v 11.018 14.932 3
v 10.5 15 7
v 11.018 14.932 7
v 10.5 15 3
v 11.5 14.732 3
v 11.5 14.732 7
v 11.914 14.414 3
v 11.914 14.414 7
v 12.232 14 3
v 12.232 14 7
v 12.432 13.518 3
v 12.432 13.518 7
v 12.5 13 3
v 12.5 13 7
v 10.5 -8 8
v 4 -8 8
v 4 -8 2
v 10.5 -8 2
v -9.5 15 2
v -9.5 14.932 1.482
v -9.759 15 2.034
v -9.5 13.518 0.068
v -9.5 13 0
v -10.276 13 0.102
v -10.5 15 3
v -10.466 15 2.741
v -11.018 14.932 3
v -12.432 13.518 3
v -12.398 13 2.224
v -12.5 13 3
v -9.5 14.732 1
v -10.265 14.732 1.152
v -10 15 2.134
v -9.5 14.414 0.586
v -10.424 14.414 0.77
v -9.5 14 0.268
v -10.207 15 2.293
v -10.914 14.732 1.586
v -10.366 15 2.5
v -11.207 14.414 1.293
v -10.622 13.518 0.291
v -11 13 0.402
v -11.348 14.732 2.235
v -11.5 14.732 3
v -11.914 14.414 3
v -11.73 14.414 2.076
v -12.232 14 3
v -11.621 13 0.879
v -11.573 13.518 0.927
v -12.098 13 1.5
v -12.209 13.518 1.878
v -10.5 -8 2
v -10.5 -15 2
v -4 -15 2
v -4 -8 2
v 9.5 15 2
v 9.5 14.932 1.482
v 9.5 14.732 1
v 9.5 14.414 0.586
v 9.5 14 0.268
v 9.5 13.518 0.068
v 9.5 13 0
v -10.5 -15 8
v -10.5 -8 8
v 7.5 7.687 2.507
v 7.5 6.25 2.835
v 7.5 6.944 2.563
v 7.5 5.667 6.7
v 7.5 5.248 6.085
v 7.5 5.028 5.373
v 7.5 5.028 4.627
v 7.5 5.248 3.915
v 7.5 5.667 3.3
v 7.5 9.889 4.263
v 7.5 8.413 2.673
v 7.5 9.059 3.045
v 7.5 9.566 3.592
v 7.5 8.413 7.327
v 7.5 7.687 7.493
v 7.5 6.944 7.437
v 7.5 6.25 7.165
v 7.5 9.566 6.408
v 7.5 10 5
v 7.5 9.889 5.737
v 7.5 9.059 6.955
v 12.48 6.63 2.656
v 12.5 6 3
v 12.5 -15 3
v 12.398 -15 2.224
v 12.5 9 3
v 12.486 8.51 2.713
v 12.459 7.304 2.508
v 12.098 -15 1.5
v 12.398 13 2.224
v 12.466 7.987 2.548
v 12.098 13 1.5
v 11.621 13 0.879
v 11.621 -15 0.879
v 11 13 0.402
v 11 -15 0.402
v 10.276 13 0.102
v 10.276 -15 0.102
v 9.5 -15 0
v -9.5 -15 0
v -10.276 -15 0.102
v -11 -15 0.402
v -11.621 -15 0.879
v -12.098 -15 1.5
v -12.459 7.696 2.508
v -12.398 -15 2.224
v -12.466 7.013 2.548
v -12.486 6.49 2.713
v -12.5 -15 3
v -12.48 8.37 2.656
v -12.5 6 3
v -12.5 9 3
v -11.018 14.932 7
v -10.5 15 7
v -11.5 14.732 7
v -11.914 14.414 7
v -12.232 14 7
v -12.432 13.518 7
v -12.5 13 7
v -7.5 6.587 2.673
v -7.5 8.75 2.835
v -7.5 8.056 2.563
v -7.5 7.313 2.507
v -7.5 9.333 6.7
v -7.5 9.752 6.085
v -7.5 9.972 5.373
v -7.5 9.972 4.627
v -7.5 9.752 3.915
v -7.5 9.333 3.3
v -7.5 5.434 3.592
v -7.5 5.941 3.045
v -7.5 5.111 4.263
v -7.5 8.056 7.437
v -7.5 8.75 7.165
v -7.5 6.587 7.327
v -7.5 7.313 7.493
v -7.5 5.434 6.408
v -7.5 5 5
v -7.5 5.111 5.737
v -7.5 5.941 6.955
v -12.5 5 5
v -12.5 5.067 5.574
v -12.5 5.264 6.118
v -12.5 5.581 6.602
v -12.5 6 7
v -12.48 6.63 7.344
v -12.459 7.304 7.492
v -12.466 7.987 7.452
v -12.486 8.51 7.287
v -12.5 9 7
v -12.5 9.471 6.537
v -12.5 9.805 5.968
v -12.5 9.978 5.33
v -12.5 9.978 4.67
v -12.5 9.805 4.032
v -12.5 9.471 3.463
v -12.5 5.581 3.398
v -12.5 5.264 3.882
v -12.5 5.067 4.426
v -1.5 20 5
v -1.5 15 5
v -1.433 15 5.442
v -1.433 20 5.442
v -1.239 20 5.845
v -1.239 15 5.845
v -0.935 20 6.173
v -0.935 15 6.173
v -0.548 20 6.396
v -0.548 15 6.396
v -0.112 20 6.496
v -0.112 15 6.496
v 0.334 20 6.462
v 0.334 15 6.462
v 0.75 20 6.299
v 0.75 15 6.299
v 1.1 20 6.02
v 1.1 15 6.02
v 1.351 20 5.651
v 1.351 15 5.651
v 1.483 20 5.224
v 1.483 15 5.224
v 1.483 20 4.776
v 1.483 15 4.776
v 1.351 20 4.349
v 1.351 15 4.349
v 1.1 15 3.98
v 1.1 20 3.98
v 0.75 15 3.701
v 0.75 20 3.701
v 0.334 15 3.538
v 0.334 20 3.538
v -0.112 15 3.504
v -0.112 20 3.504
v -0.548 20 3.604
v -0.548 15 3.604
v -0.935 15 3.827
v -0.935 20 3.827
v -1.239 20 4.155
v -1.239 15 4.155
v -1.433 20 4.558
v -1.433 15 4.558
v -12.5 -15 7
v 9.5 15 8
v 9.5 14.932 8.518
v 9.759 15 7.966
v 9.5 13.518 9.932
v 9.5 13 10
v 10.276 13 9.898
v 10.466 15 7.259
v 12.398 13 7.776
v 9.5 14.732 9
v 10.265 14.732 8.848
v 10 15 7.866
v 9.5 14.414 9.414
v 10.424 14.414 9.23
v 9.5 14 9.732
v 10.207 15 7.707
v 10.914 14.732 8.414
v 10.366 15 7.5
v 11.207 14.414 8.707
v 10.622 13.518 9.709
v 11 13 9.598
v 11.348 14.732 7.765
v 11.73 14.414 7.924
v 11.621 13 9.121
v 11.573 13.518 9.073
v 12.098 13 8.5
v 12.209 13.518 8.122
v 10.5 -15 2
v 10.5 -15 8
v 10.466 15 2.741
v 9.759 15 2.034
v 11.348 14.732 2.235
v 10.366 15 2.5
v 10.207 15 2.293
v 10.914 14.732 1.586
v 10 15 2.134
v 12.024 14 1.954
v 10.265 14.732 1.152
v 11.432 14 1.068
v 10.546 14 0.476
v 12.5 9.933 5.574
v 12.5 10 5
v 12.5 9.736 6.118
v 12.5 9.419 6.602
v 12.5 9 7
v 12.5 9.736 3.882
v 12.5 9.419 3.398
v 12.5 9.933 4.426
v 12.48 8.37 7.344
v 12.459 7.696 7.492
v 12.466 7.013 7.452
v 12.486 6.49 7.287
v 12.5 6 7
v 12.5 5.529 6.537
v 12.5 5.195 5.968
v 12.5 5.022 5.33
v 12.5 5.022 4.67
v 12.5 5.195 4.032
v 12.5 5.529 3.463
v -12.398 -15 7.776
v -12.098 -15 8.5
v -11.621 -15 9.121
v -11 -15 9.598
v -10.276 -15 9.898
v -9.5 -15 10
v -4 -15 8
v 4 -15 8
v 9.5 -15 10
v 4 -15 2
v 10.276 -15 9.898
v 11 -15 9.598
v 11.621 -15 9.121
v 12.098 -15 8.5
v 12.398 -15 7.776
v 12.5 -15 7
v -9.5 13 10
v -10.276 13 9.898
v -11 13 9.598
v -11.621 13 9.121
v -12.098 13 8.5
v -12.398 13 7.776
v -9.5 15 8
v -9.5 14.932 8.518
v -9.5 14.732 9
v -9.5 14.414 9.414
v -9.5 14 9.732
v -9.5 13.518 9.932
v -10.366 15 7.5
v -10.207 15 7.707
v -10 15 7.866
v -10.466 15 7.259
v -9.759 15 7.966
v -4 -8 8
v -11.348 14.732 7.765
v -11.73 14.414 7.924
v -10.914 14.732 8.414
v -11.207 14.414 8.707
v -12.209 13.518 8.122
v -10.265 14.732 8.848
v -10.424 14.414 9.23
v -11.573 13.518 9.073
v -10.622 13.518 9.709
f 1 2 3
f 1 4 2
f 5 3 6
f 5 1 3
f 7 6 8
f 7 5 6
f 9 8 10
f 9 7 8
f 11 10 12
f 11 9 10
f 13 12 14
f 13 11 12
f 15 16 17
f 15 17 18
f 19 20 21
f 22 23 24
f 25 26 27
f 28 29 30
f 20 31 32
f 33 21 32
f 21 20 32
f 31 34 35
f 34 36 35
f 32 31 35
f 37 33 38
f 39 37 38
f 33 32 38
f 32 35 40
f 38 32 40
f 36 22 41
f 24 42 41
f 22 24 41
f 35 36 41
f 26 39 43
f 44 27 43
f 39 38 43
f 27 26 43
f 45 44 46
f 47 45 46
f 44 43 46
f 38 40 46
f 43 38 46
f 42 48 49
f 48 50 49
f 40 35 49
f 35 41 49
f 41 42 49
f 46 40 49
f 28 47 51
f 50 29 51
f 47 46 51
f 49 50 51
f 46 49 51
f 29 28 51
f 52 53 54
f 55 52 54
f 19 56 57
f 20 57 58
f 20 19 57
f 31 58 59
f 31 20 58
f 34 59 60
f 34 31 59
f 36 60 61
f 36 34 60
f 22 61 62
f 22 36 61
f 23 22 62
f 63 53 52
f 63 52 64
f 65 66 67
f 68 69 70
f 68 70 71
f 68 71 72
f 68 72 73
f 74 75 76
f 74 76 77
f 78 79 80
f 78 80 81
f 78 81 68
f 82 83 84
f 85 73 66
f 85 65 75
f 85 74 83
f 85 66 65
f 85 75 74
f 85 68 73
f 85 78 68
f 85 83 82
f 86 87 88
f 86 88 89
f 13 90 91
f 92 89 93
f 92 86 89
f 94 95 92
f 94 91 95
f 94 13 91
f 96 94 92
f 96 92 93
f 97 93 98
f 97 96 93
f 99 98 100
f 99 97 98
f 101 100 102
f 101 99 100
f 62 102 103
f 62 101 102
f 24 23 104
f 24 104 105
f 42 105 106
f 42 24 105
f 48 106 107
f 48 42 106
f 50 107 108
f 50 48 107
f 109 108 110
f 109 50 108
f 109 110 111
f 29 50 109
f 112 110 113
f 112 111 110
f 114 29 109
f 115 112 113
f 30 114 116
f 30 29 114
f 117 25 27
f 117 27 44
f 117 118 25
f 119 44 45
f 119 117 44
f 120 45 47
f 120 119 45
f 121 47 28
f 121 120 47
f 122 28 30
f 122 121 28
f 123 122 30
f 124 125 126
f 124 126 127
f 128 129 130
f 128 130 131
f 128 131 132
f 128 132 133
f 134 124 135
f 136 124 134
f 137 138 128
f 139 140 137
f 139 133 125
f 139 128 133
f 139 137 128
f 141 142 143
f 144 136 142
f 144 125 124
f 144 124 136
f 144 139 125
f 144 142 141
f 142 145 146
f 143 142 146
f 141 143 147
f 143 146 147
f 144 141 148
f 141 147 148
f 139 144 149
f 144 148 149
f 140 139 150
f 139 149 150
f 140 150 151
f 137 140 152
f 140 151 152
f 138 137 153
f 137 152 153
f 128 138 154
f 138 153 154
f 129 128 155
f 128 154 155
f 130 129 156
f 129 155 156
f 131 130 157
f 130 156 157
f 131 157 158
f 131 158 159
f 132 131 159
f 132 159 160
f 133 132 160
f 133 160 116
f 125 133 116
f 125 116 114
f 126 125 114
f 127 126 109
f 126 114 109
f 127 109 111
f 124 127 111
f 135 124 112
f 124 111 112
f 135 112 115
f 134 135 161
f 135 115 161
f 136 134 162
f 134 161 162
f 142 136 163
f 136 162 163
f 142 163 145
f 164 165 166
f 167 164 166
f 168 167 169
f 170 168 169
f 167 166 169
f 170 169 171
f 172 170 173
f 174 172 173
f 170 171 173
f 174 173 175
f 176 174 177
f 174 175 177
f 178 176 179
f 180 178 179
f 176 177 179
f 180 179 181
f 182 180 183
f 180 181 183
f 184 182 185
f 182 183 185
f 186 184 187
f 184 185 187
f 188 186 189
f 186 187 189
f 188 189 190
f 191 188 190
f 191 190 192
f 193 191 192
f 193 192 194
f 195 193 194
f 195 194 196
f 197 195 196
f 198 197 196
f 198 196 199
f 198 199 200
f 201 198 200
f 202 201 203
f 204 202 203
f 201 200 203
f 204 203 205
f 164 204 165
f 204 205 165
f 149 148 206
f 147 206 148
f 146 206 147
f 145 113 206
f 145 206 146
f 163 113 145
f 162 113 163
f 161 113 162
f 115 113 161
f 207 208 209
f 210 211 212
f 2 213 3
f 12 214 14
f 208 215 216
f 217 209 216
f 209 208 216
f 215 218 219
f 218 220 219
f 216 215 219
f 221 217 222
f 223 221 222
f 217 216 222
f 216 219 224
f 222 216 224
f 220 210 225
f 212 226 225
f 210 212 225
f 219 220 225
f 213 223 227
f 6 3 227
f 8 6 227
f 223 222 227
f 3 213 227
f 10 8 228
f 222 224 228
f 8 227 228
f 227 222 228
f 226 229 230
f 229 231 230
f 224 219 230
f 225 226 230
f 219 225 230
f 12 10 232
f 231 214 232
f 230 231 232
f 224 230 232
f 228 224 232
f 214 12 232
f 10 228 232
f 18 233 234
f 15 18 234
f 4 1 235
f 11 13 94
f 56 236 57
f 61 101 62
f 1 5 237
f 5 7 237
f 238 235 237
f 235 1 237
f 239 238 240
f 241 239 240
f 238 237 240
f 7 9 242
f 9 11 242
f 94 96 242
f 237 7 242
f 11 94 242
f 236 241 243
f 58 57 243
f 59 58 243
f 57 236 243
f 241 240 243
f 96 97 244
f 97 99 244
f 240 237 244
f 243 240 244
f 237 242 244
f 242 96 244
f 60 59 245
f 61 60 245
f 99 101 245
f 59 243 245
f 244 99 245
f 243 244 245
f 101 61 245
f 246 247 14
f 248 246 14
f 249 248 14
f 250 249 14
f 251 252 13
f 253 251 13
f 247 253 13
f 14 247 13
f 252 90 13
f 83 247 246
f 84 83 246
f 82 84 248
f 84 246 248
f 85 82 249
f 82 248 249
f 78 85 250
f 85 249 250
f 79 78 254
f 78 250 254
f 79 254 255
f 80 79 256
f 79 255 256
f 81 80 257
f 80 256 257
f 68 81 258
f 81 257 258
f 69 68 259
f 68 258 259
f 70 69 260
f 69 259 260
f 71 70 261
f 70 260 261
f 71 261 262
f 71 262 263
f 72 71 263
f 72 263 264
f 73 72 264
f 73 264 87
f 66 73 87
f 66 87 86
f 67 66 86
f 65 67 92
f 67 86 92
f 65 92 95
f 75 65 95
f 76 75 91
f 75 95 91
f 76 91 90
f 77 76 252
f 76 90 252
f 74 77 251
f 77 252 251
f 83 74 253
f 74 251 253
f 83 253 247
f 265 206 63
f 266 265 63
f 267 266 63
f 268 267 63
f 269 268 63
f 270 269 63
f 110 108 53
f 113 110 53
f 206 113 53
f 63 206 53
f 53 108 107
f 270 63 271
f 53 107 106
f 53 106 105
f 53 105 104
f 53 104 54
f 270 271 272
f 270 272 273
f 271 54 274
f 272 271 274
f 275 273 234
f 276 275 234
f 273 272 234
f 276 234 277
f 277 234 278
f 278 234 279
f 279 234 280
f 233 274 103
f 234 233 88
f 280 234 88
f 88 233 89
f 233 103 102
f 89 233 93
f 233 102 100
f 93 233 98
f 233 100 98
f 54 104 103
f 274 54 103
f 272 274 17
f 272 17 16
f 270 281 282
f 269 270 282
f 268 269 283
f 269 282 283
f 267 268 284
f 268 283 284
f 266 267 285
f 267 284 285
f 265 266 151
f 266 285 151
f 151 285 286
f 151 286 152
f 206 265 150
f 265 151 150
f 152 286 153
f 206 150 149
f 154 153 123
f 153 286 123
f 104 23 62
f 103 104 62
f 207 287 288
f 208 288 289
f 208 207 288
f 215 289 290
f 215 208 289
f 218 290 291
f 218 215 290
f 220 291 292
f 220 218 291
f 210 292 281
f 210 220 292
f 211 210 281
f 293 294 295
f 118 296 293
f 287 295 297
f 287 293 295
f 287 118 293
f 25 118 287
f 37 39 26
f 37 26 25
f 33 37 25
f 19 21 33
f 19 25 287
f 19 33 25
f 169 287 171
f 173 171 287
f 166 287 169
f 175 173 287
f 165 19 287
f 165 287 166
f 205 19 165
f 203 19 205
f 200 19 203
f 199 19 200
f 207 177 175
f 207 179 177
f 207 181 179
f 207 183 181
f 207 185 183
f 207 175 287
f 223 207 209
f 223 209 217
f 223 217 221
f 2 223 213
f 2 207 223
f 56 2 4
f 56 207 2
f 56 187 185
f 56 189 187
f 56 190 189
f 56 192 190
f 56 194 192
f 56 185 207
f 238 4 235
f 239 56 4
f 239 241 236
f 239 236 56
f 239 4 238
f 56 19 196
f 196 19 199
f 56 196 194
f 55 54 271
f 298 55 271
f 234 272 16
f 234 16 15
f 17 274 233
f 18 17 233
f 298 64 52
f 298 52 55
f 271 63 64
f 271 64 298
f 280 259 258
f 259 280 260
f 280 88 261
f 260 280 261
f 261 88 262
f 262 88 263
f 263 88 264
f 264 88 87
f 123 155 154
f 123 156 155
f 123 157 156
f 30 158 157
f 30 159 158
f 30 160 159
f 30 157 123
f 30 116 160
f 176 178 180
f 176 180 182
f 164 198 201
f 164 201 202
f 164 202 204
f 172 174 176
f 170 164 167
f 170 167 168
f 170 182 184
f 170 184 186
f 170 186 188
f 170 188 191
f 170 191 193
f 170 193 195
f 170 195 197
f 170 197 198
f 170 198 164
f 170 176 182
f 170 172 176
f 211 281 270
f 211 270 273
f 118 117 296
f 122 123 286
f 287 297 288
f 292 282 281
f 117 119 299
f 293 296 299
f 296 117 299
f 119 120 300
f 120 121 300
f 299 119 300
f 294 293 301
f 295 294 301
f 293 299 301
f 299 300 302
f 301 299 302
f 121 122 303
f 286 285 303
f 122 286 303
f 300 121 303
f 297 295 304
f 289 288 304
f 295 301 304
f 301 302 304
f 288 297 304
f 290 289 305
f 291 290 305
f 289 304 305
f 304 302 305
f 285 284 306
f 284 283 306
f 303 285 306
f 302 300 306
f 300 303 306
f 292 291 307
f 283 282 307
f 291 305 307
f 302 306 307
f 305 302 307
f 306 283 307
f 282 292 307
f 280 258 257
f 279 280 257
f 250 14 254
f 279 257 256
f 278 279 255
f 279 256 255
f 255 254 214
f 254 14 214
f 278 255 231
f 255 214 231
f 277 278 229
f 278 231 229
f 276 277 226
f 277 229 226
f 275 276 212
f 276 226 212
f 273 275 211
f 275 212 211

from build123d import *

# Parameters (mm, degrees)
F0_W         = 25
F0_H         = 30
F1_DEPTH     = 10
F2_R         = 1.5
F3_DEPTH     = 5
F4_R         = 2.5
F5_DEPTH     = 5
F6_R         = 2.5
F7_DEPTH     = 5
F8_W         = 6.5
F8_H         = 6
F9_DEPTH     = 7
F10_T1_DEPTH = 45
F11_R        = 2


# Not quite as in the source:
# - a fillet or chamfer that OpenCascade refuses, or shapes differently, is made with other operations: its cross-section is extruded or revolved along the edge and cut away or added


with BuildPart() as f1:
    # F0 (on Top) → F1 (new body)
    with BuildSketch(Plane.XY):
        Rectangle(F0_W, F0_H)
    extrude(amount=F1_DEPTH)

    # F2 (on face) → F3 (join)
    with BuildSketch(Plane(origin=(0, 15, 0), x_dir=(-1, 0, 0), z_dir=(0, 1, 0))):
        with Locations((0, 5)):
            Circle(F2_R)
    extrude(amount=F3_DEPTH)

    # F4 (on face) → F5 (cut)
    with BuildSketch(Plane.YZ.offset(12.5)):
        with Locations((7.5, 5)):
            Circle(F4_R)
    extrude(amount=-F5_DEPTH, mode=Mode.SUBTRACT)

    # F6 (on face) → F7 (cut)
    with BuildSketch(Plane(origin=(-12.5, 0, 0), x_dir=(0, -1, 0), z_dir=(-1, 0, 0))):
        with Locations((-7.5, 5)):
            Circle(F6_R)
    extrude(amount=-F7_DEPTH, mode=Mode.SUBTRACT)

    # F8 (on face) → F9 (cut)
    with BuildSketch(Plane.XZ.offset(15)):
        with Locations((7.25, 5)):
            Rectangle(F8_W, F8_H)
        with Locations((-7.25, 5)):
            Rectangle(F8_W, F8_H)
    extrude(amount=-F9_DEPTH, mode=Mode.SUBTRACT)

    # F10: fillet of radius 3 on 4 edges, made by hand

    # F10_s2 → F10_t1 (cut)
    with BuildSketch(Plane.XZ.offset(-22.5)):
        with BuildLine():
            ThreePointArc((-9.5, 10), (-11.6213203436, 9.1213203436), (-12.5, 7))
            Line((-12.5, 7), (-12.5, 10))
            Line((-12.5, 10), (-9.5, 10))
        make_face()
        with BuildLine():
            ThreePointArc((12.5, 7), (11.6213203436, 9.1213203436), (9.5, 10))
            Line((9.5, 10), (12.5, 10))
            Line((12.5, 10), (12.5, 7))
        make_face()
        with BuildLine():
            ThreePointArc((12.5, 3), (11.6213203436, 0.8786796564), (9.5, 0))
            Line((9.5, 0), (12.5, 0))
            Line((12.5, 0), (12.5, 3))
        make_face()
        with BuildLine():
            ThreePointArc((-9.5, 0), (-11.6213203436, 0.8786796564), (-12.5, 3))
            Line((-12.5, 3), (-12.5, 0))
            Line((-12.5, 0), (-9.5, 0))
        make_face()
    extrude(amount=F10_T1_DEPTH, mode=Mode.SUBTRACT)

    # F11
    f11_edges = [f1.edges().sort_by_distance(p)[0] for p in [
        (11.62132, 15, 0.87868),
        (12.5, 15, 5),
        (11.62132, 15, 9.12132),
        (0, 15, 0),
        (-11.62132, 15, 0.87868),
        (-12.5, 15, 5),
        (-11.62132, 15, 9.12132),
        (0, 15, 10),
    ]]
    fillet(f11_edges, radius=F11_R)


solid = f1.part
